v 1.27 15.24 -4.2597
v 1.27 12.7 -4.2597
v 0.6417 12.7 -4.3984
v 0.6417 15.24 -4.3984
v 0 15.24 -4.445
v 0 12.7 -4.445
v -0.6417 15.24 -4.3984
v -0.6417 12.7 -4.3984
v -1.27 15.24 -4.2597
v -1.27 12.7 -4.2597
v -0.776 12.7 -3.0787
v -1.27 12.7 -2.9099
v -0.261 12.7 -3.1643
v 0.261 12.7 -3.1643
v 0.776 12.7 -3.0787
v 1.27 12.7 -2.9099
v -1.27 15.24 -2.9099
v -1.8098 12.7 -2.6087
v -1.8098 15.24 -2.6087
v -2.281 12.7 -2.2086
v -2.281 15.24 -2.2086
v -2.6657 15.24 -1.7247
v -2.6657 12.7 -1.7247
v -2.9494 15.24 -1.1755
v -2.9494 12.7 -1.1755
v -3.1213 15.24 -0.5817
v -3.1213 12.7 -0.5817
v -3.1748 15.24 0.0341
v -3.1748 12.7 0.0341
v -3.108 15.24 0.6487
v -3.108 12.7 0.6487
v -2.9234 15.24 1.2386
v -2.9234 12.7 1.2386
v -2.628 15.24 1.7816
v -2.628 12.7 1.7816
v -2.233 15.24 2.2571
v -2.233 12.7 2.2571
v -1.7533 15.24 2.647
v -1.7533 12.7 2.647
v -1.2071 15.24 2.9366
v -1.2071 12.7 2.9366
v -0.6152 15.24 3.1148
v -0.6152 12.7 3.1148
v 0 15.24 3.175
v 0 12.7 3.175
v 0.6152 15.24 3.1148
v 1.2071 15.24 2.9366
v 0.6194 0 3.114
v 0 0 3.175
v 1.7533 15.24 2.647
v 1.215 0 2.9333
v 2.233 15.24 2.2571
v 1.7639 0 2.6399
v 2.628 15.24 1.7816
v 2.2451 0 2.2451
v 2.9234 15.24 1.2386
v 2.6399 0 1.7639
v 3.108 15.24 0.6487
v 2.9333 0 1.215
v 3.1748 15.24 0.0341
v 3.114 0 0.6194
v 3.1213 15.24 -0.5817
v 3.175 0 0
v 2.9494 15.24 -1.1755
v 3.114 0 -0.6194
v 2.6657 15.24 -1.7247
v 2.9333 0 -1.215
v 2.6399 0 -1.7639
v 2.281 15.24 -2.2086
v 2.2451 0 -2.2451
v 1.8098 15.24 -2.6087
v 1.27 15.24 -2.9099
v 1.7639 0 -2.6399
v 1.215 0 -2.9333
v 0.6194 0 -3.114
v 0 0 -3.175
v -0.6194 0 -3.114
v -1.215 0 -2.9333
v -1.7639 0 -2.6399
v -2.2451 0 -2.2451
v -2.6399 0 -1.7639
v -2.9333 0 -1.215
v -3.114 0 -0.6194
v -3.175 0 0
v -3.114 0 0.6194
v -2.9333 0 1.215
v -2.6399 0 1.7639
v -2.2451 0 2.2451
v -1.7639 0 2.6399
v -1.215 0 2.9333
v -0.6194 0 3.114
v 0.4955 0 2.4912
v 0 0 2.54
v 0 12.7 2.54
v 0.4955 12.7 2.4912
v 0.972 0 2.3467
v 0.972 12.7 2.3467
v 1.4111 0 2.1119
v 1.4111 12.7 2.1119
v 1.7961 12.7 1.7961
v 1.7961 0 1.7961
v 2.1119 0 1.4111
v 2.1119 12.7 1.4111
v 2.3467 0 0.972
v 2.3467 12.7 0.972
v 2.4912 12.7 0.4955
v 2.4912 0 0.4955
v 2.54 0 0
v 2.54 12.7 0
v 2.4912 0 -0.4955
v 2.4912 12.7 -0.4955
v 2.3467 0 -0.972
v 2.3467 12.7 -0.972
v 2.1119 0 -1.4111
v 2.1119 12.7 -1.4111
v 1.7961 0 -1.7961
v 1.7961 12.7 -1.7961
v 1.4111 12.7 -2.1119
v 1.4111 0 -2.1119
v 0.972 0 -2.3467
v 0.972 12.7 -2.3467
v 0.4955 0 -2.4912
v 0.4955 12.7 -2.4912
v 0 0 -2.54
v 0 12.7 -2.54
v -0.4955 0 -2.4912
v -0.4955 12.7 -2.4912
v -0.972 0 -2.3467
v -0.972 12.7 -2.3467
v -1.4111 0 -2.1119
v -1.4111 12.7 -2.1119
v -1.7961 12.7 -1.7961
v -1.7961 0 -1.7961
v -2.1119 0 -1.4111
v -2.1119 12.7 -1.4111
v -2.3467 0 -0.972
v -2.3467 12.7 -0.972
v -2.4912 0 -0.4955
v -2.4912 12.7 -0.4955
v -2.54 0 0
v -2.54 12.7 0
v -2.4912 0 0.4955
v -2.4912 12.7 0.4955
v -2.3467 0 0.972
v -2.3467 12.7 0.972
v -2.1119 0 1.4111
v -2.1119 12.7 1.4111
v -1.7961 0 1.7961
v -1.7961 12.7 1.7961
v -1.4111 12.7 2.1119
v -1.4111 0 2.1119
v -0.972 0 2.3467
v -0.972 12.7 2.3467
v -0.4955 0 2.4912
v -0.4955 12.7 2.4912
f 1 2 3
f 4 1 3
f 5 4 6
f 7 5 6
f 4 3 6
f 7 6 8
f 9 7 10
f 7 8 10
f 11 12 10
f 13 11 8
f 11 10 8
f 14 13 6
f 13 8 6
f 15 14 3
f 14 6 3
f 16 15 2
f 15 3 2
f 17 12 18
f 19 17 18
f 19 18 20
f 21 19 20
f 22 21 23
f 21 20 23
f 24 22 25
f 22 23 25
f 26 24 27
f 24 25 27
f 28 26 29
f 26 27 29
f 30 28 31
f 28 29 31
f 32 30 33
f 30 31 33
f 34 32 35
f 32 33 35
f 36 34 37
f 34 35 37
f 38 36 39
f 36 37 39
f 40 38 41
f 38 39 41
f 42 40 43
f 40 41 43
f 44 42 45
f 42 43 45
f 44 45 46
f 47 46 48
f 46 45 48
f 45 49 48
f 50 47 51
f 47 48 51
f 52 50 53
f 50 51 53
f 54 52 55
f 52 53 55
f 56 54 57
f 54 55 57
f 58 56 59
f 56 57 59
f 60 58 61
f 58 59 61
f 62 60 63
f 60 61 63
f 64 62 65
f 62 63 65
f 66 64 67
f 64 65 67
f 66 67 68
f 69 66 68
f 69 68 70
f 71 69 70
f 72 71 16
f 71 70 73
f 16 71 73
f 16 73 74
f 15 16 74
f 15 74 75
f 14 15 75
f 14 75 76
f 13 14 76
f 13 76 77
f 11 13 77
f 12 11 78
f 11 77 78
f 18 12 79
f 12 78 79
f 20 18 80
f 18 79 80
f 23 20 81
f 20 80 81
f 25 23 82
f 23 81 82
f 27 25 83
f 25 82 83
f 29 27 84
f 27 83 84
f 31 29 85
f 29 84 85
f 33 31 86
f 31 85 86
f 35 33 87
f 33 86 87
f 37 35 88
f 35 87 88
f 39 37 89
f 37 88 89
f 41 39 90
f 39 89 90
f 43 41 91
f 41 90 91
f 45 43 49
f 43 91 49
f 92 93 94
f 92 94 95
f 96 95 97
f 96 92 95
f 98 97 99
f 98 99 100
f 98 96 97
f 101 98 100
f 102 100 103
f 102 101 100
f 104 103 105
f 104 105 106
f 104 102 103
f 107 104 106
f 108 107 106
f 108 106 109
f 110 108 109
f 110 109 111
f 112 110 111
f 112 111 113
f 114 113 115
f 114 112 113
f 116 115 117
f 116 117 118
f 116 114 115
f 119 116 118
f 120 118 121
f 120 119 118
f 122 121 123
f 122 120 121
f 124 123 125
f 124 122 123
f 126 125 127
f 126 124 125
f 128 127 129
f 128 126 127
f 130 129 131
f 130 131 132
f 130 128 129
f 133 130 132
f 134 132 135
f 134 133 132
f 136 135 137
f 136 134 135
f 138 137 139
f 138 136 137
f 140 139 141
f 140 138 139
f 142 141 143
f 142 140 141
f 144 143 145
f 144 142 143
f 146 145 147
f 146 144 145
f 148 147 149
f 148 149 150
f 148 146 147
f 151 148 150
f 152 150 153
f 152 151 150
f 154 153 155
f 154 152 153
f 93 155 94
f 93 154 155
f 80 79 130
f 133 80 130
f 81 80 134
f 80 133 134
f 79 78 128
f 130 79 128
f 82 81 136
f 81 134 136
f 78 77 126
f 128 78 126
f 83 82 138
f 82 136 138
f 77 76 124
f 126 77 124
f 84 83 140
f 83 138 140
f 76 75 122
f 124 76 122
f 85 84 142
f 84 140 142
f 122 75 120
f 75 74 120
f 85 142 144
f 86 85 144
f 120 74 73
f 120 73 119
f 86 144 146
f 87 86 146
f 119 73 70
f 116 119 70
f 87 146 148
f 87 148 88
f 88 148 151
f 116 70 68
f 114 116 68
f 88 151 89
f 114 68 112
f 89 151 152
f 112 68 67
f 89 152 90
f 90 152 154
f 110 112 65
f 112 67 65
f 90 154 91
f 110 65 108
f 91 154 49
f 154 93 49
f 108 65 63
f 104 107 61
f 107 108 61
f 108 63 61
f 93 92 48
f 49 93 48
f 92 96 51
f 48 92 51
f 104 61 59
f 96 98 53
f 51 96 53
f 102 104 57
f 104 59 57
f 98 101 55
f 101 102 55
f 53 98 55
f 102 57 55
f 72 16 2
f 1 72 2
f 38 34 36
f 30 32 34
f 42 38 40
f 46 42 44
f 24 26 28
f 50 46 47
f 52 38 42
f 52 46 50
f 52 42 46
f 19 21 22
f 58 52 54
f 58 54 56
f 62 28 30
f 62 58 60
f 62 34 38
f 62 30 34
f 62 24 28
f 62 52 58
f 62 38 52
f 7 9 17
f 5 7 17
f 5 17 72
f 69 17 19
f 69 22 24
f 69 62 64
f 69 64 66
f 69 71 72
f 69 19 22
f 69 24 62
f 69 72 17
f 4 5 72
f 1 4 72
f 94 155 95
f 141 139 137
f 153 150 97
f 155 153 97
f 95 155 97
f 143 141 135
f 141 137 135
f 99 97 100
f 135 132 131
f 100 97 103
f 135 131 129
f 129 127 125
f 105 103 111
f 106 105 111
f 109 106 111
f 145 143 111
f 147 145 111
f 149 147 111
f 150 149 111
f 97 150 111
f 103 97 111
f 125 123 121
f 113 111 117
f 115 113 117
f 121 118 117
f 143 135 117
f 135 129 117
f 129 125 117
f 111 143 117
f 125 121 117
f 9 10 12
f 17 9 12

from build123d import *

# Parameters (mm, degrees)
SKETCH1_R           = 3.175
SKETCH1_R_2         = 2.54
BOSS_EXTRUDE1_DEPTH = 12.7
BOSS_EXTRUDE2_DEPTH = 2.54


with BuildPart() as part:
    # Sketch1 → Boss-Extrude1 (new body)
    with BuildSketch(Plane(origin=(0, 0, 0), x_dir=(1, 0, 0), z_dir=(0, 1, 0))):
        with Locations(Location((0, 0, 0), (0, 0, 270))):
            Circle(SKETCH1_R)
        with Locations(Location((0, 0, 0), (0, 0, 270))):
            Circle(SKETCH1_R_2, mode=Mode.SUBTRACT)
    extrude(amount=BOSS_EXTRUDE1_DEPTH)

    # Sketch3 → Boss-Extrude2 (add)
    with BuildSketch(Plane(origin=(0, 12.7, 0), x_dir=(1, 0, 0), z_dir=(0, 1, 0))):
        with BuildLine():
            Line((-1.27, 4.259709497), (-1.27, 2.909935566))
            ThreePointArc((-1.27, 2.909935566), (0, -3.175), (1.27, 2.909935566))
            Line((1.27, 2.909935566), (1.27, 4.259709497))
            ThreePointArc((1.27, 4.259709497), (0, 4.445), (-1.27, 4.259709497))
        make_face()
    extrude(amount=BOSS_EXTRUDE2_DEPTH)


solid = part.part
